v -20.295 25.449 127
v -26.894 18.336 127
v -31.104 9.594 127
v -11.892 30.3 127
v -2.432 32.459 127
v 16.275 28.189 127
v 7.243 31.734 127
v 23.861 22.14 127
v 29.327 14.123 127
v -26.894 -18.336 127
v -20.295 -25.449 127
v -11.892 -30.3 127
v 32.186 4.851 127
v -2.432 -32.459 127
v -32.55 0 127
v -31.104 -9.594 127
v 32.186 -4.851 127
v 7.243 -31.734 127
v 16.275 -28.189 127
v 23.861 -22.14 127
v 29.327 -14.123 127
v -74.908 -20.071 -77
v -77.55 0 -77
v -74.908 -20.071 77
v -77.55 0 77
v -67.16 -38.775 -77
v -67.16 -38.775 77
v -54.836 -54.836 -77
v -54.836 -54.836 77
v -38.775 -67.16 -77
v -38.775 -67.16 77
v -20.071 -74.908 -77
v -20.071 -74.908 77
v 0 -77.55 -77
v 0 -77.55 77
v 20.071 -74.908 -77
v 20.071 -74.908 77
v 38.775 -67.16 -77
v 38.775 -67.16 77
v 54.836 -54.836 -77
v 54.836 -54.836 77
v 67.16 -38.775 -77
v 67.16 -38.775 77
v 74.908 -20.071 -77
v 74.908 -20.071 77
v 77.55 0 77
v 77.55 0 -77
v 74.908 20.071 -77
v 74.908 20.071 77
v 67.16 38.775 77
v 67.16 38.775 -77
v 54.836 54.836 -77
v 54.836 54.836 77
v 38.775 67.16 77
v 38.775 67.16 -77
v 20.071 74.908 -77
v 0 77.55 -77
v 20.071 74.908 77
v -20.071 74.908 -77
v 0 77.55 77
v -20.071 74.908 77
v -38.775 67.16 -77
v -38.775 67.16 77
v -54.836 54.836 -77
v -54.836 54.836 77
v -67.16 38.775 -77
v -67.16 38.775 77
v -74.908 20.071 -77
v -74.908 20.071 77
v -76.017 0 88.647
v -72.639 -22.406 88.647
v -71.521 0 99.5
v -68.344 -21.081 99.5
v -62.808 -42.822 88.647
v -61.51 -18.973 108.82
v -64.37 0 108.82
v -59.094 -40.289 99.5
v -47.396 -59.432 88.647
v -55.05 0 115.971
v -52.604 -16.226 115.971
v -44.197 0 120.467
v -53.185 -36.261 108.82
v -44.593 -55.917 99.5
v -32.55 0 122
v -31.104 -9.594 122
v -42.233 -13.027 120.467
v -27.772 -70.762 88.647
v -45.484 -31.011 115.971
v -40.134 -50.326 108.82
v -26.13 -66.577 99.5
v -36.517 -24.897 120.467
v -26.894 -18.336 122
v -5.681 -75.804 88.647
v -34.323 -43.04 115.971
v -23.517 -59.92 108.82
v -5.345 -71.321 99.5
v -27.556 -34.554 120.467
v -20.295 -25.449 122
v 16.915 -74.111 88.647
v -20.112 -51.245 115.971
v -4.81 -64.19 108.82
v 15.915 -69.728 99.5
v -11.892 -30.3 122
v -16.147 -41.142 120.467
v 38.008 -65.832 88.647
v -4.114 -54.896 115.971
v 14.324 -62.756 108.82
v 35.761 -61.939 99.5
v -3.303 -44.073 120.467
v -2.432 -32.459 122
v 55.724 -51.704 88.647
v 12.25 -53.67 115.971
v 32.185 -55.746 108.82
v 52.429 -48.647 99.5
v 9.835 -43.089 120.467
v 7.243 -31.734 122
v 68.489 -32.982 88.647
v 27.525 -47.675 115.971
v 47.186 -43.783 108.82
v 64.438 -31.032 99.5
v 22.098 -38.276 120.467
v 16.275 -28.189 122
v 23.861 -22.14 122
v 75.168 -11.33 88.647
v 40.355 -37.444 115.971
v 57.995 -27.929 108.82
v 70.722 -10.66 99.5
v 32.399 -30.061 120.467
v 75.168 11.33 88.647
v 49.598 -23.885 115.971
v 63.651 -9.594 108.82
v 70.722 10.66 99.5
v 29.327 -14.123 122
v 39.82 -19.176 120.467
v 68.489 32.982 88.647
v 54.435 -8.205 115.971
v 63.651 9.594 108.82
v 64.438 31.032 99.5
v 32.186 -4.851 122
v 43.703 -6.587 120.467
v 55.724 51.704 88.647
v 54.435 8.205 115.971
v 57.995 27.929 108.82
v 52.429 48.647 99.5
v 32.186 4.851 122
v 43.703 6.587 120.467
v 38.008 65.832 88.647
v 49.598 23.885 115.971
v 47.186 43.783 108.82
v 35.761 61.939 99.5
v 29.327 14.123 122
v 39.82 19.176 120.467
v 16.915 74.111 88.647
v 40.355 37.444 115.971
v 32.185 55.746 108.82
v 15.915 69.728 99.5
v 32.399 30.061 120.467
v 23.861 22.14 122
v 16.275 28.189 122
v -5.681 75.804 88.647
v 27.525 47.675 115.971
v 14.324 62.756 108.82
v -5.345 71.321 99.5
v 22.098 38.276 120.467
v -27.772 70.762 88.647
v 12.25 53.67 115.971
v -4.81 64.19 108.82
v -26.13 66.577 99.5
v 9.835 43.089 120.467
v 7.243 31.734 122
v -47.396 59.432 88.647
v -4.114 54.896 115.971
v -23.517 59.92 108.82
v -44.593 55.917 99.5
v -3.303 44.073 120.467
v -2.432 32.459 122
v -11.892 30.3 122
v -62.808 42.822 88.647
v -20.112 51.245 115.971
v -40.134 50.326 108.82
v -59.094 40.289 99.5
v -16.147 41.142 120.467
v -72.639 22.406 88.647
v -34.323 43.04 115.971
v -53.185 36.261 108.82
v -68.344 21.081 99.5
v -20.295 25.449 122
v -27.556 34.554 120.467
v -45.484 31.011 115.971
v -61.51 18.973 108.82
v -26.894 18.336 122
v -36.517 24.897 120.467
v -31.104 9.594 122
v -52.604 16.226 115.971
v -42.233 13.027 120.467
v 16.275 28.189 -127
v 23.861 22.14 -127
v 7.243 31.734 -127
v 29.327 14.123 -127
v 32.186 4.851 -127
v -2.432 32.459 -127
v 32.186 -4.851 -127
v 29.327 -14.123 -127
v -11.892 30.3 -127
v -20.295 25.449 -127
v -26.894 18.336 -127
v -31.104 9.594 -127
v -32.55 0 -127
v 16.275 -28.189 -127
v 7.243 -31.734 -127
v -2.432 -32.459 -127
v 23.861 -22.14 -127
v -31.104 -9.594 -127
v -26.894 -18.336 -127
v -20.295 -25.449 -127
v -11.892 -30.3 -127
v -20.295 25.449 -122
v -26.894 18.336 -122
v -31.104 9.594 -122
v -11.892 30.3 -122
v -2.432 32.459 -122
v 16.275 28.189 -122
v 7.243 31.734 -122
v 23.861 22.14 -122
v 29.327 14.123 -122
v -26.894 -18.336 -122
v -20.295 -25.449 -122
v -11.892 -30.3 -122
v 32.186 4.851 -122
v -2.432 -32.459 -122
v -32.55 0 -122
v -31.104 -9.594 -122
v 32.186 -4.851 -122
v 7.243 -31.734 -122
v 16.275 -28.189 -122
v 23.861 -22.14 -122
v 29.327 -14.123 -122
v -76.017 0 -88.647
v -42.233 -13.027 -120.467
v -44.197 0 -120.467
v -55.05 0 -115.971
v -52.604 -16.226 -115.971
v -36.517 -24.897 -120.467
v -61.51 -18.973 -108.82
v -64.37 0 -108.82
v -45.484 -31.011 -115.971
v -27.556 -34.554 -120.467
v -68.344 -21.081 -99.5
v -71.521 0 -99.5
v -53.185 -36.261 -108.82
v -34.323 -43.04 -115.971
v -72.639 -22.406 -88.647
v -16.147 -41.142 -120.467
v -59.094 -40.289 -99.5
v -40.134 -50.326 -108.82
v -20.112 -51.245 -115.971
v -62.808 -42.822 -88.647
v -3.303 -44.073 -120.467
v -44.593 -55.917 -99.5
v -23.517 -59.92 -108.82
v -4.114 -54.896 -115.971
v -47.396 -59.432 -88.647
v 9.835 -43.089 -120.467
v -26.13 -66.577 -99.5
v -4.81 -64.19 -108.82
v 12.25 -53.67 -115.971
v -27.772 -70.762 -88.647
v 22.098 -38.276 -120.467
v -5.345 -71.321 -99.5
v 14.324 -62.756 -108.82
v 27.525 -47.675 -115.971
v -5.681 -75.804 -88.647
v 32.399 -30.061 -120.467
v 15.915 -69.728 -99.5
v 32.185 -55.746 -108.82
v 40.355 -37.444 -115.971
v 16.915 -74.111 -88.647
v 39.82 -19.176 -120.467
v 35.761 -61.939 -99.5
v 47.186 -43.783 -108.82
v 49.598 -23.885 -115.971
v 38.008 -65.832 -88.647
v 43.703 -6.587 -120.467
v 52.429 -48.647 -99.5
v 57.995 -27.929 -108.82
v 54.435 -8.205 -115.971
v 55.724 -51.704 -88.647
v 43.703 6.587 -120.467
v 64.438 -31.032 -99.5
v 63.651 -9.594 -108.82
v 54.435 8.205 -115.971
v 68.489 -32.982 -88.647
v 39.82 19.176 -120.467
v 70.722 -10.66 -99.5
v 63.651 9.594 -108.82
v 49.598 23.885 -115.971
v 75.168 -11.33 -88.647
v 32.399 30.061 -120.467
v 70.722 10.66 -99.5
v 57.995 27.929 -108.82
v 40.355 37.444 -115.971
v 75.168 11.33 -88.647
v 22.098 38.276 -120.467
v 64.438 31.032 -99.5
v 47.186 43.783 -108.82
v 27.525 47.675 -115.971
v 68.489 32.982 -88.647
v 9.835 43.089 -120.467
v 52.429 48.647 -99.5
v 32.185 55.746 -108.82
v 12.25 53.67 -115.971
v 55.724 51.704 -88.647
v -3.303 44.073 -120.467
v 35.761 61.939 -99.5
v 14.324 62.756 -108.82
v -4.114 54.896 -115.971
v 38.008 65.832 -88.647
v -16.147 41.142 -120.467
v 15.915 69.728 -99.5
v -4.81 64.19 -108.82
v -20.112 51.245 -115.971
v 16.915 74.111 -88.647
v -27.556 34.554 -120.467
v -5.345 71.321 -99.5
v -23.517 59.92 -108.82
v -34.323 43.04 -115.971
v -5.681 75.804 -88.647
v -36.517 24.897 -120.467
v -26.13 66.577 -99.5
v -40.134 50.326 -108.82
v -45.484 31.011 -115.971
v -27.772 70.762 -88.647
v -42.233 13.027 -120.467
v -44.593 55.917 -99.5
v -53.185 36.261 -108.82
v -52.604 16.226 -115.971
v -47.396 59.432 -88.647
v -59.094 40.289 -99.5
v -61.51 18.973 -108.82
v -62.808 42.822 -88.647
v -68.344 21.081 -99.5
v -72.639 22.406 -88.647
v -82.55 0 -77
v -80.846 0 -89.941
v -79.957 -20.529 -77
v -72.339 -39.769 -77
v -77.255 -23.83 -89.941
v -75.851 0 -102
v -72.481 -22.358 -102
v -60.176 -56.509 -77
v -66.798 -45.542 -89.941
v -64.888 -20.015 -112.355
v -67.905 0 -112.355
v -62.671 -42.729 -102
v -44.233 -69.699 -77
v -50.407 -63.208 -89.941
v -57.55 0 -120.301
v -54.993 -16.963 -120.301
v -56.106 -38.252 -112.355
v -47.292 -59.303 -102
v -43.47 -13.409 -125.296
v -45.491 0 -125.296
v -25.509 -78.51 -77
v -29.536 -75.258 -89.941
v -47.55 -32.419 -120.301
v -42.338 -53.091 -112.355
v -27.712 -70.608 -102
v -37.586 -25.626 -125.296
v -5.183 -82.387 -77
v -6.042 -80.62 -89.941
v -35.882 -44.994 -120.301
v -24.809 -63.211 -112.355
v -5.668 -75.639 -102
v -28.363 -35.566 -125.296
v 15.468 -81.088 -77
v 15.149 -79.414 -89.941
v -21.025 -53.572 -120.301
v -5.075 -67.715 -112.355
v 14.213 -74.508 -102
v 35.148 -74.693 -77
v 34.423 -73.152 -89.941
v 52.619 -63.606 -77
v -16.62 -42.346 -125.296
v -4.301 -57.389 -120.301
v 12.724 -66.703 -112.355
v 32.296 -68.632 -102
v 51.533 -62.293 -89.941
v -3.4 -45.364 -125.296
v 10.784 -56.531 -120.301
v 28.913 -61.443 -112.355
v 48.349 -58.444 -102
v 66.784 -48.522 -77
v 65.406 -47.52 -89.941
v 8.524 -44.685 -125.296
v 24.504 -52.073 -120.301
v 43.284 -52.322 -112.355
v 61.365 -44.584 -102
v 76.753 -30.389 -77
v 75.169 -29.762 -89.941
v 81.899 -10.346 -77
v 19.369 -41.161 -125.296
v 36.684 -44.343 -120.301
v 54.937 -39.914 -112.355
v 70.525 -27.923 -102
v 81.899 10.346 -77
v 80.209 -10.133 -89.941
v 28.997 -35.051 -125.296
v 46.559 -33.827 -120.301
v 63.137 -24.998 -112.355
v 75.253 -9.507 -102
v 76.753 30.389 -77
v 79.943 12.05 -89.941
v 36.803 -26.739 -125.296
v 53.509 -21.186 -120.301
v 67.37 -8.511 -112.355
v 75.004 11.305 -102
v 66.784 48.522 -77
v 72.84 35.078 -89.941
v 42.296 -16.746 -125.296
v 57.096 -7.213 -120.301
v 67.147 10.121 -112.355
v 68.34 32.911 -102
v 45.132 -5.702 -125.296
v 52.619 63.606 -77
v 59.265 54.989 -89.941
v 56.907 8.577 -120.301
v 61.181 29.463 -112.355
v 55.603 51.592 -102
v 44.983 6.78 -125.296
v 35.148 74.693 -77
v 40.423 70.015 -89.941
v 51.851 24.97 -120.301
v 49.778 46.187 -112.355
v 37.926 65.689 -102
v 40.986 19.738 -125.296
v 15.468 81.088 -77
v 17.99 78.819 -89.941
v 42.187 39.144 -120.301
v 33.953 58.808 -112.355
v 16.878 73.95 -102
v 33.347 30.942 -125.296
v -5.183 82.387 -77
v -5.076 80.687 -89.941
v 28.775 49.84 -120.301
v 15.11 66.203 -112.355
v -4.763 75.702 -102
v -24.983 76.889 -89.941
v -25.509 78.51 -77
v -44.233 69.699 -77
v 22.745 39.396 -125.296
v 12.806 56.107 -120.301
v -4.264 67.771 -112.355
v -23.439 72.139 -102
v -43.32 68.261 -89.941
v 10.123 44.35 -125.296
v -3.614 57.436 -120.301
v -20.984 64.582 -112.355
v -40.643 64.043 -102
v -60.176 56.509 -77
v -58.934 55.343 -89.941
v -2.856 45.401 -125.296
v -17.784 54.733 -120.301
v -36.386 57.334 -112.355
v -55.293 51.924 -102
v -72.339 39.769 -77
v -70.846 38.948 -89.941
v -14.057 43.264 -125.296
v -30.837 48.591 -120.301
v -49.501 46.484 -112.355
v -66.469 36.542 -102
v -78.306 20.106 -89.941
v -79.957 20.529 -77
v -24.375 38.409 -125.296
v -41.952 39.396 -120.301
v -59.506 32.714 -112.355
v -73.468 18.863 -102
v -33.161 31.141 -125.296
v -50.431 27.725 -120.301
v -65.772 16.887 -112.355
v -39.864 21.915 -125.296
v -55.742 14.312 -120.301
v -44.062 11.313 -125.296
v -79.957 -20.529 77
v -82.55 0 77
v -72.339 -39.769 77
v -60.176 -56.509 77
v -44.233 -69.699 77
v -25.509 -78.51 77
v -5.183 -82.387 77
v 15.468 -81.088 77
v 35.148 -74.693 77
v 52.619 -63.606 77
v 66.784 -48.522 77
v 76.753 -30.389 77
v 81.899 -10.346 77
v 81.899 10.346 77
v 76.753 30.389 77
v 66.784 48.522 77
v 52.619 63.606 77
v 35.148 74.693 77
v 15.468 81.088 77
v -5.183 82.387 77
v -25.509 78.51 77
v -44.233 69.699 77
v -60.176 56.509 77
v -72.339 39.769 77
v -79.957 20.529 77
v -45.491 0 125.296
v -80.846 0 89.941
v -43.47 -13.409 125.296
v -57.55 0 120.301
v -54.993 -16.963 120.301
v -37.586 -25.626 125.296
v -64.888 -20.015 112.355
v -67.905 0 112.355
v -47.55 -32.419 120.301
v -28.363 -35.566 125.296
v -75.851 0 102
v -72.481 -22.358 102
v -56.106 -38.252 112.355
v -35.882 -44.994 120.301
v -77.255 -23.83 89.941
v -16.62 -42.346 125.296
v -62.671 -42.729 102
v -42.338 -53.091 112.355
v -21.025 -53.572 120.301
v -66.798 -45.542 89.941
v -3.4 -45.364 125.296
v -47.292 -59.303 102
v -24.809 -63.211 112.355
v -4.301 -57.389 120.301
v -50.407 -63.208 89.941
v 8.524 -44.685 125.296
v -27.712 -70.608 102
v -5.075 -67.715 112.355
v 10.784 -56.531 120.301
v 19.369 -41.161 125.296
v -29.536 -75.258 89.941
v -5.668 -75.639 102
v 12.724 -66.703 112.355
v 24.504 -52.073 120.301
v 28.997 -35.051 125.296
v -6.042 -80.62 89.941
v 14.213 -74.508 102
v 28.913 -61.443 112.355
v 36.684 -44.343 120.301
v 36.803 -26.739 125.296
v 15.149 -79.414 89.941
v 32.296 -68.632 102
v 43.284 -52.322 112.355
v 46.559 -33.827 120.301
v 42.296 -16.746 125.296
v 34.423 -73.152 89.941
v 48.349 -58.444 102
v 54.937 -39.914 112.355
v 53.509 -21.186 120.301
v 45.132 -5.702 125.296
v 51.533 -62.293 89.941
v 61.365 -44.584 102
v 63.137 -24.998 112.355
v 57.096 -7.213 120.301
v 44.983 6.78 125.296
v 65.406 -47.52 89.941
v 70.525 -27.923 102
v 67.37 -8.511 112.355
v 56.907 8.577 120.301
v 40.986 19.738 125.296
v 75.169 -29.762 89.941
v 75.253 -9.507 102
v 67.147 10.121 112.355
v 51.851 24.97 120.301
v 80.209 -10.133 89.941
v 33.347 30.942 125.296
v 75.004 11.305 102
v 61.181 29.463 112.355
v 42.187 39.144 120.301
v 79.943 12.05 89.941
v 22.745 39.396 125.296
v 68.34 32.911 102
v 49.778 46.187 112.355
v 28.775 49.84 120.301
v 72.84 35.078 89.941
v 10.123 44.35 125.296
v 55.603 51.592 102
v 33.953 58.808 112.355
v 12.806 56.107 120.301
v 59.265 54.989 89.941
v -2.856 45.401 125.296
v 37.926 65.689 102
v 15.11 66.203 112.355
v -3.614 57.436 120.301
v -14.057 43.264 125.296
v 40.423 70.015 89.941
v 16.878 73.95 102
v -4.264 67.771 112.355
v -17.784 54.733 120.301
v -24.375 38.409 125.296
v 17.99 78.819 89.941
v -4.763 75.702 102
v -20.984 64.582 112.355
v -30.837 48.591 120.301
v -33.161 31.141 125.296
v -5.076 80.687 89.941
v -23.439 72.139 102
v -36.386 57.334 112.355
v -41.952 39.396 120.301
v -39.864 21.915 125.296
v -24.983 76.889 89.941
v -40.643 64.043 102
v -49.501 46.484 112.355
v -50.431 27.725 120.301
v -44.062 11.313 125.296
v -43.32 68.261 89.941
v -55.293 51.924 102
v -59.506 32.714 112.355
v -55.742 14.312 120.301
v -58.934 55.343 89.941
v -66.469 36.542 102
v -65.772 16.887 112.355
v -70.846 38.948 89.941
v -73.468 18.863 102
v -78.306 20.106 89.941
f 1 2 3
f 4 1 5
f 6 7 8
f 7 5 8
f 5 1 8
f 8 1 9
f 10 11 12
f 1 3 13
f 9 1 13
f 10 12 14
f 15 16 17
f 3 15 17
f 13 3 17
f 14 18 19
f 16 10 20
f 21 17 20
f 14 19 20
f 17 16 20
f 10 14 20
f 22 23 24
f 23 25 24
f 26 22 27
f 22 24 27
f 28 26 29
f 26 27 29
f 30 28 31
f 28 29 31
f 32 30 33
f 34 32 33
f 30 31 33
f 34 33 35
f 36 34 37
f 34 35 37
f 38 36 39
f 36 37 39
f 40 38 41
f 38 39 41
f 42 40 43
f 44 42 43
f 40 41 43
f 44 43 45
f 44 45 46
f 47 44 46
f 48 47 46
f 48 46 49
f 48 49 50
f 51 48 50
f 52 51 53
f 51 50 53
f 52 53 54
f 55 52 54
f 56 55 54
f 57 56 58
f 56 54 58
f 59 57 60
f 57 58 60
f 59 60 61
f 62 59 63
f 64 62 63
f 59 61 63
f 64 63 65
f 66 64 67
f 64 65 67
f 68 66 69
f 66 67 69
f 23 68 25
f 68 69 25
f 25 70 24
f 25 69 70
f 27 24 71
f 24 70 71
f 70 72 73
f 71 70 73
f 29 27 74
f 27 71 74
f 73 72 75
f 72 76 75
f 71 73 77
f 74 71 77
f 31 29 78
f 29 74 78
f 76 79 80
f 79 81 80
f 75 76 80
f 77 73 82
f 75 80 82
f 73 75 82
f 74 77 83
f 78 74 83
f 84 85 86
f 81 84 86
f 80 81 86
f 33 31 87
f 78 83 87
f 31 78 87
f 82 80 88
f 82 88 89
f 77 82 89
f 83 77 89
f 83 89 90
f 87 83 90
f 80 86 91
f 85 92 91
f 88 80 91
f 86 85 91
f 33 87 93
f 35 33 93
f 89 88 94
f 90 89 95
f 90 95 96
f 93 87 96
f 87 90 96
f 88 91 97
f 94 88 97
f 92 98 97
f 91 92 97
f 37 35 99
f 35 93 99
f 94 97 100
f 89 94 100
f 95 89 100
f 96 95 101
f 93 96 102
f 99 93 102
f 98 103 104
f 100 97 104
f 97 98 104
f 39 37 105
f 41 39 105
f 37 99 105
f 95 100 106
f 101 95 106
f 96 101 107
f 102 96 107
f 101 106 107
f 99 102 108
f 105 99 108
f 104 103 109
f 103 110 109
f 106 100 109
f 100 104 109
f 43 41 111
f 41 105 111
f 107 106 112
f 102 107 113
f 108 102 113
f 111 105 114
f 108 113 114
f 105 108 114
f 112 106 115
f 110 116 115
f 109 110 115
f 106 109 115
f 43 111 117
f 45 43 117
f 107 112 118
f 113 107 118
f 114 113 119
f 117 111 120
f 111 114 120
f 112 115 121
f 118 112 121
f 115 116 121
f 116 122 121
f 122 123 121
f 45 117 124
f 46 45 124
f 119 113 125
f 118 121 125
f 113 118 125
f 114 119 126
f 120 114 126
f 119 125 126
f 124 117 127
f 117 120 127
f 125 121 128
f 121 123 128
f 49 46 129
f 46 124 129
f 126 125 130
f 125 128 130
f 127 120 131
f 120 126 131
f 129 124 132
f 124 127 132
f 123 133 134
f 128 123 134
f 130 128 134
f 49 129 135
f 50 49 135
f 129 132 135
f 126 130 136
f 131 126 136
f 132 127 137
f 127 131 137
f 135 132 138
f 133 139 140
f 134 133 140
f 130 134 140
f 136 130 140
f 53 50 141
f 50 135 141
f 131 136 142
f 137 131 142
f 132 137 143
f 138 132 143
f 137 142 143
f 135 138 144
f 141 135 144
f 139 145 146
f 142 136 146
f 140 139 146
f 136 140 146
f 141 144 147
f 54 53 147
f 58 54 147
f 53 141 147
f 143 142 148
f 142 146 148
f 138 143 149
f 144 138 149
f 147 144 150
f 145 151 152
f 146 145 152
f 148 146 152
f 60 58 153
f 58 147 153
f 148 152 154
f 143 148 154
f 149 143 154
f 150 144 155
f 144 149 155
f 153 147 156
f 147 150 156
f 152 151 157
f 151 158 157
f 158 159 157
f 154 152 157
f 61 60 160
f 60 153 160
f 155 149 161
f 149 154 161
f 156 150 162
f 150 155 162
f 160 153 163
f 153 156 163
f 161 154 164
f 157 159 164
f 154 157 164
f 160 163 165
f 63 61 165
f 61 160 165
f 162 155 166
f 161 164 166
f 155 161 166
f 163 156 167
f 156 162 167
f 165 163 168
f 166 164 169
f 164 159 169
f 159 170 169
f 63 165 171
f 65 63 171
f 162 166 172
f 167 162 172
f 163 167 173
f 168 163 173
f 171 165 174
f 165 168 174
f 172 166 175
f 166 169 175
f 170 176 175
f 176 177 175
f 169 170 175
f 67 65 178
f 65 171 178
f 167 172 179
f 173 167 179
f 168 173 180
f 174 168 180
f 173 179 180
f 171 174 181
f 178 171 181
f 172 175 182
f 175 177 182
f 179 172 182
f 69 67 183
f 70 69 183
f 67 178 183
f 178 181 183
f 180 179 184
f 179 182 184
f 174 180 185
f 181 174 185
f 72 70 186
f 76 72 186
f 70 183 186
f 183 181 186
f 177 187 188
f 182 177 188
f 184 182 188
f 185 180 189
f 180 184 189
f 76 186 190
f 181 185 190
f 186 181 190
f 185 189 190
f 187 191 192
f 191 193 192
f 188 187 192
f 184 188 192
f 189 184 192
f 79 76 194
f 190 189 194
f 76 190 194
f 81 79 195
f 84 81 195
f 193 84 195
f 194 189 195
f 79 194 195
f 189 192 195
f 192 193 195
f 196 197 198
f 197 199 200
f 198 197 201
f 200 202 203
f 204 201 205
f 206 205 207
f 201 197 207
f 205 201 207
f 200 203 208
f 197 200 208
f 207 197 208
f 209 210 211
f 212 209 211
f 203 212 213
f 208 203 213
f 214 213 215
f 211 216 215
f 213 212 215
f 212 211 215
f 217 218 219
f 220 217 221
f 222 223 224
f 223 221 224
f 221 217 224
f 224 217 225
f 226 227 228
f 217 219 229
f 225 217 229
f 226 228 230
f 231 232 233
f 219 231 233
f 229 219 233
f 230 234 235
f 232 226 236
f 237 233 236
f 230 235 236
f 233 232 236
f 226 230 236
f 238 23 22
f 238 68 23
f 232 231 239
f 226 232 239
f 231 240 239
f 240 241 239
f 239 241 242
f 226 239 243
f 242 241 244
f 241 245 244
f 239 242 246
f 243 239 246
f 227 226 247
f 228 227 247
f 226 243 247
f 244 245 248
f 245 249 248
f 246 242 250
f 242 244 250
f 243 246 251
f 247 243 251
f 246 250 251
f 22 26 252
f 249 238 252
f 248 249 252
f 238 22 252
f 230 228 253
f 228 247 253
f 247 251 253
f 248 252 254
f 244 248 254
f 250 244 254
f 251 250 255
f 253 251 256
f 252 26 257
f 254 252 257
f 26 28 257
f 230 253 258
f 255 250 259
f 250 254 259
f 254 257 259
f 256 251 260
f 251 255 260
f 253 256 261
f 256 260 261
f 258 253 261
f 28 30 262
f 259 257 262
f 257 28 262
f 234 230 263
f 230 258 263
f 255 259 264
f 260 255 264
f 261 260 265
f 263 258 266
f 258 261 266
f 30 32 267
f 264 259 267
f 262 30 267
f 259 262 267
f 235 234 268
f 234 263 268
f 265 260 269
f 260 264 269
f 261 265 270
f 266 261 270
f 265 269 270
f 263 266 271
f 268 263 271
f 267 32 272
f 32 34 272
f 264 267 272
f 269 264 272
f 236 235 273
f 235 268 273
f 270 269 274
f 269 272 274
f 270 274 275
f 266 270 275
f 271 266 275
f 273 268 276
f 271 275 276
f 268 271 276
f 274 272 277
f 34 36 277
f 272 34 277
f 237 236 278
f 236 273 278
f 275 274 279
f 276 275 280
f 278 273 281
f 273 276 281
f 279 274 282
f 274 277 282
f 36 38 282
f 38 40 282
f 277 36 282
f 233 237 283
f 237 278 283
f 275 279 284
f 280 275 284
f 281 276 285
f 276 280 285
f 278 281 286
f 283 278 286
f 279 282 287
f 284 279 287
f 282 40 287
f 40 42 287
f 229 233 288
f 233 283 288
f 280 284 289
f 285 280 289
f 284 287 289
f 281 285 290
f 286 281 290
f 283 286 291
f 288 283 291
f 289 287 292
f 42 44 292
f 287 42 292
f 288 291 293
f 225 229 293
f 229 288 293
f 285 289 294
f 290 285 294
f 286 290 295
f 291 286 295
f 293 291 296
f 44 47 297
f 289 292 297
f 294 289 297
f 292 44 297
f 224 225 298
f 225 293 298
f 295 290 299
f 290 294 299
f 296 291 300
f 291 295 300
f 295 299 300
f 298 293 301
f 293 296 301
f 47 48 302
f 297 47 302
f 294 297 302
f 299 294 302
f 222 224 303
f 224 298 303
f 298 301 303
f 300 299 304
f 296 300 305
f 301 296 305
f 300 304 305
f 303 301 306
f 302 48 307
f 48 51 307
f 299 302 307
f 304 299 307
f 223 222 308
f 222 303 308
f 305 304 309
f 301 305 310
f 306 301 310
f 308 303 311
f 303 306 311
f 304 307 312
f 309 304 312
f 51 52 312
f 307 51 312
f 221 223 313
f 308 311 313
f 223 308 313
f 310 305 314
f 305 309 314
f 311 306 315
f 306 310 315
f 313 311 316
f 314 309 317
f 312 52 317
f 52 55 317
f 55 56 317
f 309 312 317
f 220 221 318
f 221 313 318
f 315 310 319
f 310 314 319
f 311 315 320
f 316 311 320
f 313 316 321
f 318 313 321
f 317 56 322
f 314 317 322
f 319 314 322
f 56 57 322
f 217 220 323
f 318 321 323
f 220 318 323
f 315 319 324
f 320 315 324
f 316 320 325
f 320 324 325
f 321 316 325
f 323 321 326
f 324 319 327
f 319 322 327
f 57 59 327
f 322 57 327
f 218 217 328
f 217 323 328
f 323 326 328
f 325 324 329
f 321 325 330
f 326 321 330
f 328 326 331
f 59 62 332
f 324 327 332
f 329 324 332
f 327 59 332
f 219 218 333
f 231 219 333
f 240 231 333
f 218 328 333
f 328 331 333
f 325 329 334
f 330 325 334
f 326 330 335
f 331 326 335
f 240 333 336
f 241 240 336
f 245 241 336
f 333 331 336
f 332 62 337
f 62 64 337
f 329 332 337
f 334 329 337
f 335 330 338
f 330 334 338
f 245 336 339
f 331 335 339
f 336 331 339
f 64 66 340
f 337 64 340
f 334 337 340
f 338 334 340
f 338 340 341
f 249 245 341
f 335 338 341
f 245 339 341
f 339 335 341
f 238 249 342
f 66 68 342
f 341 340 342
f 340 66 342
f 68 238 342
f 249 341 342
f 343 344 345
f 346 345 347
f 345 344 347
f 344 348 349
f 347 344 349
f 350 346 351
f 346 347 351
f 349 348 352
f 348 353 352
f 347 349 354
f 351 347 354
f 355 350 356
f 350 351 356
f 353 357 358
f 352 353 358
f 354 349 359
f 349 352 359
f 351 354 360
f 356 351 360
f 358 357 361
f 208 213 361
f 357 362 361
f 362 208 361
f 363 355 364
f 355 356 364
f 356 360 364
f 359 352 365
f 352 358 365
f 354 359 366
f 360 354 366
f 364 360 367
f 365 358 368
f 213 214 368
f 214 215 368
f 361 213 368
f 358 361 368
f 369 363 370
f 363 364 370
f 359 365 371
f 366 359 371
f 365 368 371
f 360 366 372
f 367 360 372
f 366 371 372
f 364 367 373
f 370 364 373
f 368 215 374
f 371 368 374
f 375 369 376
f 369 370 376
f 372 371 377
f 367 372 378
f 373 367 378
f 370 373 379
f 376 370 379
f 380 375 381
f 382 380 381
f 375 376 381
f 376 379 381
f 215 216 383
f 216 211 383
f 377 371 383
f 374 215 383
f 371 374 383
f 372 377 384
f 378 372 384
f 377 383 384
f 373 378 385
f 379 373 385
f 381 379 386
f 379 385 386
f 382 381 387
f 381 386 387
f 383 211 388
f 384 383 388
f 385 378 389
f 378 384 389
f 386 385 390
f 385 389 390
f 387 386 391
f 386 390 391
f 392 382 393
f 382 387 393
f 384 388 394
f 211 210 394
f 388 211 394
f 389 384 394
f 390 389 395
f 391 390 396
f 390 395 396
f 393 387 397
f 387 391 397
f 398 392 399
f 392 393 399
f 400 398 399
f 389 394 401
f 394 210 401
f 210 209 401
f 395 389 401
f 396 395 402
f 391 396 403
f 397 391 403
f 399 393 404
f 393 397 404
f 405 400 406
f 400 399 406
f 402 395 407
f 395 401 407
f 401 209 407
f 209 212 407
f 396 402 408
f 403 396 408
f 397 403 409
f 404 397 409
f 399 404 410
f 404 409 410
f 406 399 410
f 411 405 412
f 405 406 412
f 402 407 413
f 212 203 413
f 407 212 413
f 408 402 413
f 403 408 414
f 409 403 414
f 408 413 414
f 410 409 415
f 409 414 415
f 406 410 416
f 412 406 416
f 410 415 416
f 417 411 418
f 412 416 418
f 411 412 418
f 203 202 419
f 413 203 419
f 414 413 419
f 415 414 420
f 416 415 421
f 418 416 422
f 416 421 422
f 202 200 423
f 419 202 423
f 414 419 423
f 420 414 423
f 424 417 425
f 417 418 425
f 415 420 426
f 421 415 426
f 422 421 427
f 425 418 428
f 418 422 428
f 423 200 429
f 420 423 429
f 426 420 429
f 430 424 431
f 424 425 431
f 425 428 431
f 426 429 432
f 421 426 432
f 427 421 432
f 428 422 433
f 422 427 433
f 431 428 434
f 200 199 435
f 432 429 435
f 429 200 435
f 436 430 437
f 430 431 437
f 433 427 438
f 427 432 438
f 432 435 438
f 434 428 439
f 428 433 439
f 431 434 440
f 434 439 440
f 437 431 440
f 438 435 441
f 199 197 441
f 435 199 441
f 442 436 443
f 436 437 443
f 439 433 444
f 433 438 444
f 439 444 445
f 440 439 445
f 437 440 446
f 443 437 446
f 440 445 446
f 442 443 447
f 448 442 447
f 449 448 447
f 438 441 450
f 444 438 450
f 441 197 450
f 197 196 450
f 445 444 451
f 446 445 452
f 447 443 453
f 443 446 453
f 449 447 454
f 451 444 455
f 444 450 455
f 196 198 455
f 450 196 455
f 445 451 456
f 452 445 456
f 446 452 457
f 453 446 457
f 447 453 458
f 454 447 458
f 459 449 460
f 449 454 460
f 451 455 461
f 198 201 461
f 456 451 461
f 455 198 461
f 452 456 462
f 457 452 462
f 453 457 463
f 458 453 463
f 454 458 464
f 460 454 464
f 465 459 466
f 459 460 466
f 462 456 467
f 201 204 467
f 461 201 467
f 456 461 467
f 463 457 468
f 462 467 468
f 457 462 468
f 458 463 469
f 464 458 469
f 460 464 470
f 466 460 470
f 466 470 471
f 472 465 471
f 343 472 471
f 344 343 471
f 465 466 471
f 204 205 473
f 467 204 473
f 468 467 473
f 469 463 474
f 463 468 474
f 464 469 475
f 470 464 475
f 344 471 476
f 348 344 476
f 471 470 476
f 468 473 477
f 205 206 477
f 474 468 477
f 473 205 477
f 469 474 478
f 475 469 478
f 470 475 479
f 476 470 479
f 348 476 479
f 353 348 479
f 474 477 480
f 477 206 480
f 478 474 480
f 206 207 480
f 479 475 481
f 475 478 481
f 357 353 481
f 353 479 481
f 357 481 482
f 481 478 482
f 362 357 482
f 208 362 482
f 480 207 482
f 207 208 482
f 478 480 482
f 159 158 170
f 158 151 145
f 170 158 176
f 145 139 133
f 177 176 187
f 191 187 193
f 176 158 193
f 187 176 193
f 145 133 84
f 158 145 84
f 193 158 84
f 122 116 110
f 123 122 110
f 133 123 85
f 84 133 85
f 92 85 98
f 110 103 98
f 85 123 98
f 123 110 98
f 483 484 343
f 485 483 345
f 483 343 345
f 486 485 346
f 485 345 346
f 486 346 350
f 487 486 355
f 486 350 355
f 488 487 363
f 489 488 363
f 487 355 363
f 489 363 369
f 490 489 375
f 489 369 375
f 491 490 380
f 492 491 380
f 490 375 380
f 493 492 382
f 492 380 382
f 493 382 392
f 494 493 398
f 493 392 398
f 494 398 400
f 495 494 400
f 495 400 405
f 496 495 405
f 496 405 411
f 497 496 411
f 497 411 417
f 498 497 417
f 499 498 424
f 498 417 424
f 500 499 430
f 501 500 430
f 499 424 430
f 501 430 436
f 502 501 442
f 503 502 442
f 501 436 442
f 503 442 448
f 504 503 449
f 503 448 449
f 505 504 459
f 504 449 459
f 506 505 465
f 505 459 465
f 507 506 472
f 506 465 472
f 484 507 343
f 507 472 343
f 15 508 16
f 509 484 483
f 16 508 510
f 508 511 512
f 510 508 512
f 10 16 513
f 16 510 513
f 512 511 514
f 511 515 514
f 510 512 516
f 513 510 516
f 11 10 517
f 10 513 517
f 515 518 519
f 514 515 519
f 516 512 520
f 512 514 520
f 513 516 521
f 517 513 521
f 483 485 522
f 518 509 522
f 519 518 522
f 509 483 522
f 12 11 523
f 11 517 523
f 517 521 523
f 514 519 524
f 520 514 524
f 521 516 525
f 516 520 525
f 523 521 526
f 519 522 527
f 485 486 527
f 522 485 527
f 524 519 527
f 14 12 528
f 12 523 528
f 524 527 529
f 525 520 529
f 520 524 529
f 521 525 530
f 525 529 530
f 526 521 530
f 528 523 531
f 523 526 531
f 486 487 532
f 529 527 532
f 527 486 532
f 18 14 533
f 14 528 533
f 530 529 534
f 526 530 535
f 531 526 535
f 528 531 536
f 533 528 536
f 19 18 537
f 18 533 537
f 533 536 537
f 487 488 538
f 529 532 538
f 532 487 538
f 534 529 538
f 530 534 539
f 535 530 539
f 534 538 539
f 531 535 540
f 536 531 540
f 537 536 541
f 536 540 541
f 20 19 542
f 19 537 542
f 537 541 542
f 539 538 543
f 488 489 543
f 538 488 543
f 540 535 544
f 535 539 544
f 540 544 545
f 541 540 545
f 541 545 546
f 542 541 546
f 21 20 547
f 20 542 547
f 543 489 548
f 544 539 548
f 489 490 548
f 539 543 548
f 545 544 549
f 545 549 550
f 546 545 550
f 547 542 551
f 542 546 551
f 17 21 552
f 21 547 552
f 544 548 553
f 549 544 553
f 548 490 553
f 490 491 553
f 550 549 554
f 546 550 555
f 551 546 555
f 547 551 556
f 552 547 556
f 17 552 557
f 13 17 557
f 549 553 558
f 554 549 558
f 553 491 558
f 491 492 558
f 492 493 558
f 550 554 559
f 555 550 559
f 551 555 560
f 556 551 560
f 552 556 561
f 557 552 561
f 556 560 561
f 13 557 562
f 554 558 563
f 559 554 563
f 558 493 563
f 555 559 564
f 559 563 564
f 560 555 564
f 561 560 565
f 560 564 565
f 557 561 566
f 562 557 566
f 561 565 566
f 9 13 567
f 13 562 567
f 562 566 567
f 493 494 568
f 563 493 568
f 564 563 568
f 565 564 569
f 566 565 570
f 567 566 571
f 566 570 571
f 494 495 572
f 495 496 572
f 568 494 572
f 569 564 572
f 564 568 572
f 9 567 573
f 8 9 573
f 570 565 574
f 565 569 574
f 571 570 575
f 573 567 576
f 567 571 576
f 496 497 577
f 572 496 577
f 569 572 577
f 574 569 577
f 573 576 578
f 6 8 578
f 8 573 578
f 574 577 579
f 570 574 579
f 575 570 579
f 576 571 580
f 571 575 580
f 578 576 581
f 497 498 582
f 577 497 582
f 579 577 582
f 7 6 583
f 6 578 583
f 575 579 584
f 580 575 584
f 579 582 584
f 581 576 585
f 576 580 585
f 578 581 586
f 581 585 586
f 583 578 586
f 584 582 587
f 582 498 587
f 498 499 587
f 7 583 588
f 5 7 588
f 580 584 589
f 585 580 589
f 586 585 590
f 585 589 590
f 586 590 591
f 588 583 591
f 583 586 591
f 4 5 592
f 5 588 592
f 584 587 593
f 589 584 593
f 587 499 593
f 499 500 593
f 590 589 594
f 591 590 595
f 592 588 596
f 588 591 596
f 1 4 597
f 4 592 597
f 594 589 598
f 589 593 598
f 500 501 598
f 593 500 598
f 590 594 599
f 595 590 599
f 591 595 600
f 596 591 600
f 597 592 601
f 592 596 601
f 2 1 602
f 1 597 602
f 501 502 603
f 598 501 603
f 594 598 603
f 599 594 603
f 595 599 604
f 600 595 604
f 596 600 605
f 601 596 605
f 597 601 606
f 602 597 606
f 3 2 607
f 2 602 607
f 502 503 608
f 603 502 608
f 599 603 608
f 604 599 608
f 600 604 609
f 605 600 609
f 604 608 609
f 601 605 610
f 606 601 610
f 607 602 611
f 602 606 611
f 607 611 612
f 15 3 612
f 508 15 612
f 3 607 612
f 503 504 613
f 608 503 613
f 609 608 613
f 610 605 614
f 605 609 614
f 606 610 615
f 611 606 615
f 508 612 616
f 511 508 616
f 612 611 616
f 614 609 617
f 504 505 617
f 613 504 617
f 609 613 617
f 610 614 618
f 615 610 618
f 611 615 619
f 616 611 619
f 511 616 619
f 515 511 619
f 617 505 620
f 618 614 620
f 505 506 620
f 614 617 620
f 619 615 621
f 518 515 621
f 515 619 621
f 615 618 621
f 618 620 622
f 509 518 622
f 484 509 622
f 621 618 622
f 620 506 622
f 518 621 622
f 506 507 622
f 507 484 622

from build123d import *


with BuildPart() as part:
    # Sketch1 → Revolve1 (revolve)
    with BuildSketch(Plane(origin=(0, 0, 0), x_dir=(0, 0, -1), z_dir=(1, 0, 0)), mode=Mode.PRIVATE) as revolve1_sk:
        with BuildLine():
            Line((-77, 82.55), (77, 82.55))
            ThreePointArc((77, 82.55), (112.355339059, 67.905339059), (127, 32.55))
            Line((127, 32.55), (127, 0))
            Line((127, 0), (122, 0))
            Line((122, 0), (122, 32.55))
            ThreePointArc((122, 32.55), (108.819805153, 64.369805153), (77, 77.55))
            Line((77, 77.55), (-77, 77.55))
            ThreePointArc((-77, 77.55), (-108.819805153, 64.369805153), (-122, 32.55))
            Line((-122, 32.55), (-122, 0))
            Line((-122, 0), (-127, 0))
            Line((-127, 0), (-127, 32.55))
            ThreePointArc((-127, 32.55), (-112.355339059, 67.905339059), (-77, 82.55))
        make_face()
    revolve(revolve1_sk.sketch.rotate(Axis((0, 0, -193.425688195), (0, 0, 1)), 90), axis=Axis((0, 0, -193.425688195), (0, 0, 1)))


solid = part.part
